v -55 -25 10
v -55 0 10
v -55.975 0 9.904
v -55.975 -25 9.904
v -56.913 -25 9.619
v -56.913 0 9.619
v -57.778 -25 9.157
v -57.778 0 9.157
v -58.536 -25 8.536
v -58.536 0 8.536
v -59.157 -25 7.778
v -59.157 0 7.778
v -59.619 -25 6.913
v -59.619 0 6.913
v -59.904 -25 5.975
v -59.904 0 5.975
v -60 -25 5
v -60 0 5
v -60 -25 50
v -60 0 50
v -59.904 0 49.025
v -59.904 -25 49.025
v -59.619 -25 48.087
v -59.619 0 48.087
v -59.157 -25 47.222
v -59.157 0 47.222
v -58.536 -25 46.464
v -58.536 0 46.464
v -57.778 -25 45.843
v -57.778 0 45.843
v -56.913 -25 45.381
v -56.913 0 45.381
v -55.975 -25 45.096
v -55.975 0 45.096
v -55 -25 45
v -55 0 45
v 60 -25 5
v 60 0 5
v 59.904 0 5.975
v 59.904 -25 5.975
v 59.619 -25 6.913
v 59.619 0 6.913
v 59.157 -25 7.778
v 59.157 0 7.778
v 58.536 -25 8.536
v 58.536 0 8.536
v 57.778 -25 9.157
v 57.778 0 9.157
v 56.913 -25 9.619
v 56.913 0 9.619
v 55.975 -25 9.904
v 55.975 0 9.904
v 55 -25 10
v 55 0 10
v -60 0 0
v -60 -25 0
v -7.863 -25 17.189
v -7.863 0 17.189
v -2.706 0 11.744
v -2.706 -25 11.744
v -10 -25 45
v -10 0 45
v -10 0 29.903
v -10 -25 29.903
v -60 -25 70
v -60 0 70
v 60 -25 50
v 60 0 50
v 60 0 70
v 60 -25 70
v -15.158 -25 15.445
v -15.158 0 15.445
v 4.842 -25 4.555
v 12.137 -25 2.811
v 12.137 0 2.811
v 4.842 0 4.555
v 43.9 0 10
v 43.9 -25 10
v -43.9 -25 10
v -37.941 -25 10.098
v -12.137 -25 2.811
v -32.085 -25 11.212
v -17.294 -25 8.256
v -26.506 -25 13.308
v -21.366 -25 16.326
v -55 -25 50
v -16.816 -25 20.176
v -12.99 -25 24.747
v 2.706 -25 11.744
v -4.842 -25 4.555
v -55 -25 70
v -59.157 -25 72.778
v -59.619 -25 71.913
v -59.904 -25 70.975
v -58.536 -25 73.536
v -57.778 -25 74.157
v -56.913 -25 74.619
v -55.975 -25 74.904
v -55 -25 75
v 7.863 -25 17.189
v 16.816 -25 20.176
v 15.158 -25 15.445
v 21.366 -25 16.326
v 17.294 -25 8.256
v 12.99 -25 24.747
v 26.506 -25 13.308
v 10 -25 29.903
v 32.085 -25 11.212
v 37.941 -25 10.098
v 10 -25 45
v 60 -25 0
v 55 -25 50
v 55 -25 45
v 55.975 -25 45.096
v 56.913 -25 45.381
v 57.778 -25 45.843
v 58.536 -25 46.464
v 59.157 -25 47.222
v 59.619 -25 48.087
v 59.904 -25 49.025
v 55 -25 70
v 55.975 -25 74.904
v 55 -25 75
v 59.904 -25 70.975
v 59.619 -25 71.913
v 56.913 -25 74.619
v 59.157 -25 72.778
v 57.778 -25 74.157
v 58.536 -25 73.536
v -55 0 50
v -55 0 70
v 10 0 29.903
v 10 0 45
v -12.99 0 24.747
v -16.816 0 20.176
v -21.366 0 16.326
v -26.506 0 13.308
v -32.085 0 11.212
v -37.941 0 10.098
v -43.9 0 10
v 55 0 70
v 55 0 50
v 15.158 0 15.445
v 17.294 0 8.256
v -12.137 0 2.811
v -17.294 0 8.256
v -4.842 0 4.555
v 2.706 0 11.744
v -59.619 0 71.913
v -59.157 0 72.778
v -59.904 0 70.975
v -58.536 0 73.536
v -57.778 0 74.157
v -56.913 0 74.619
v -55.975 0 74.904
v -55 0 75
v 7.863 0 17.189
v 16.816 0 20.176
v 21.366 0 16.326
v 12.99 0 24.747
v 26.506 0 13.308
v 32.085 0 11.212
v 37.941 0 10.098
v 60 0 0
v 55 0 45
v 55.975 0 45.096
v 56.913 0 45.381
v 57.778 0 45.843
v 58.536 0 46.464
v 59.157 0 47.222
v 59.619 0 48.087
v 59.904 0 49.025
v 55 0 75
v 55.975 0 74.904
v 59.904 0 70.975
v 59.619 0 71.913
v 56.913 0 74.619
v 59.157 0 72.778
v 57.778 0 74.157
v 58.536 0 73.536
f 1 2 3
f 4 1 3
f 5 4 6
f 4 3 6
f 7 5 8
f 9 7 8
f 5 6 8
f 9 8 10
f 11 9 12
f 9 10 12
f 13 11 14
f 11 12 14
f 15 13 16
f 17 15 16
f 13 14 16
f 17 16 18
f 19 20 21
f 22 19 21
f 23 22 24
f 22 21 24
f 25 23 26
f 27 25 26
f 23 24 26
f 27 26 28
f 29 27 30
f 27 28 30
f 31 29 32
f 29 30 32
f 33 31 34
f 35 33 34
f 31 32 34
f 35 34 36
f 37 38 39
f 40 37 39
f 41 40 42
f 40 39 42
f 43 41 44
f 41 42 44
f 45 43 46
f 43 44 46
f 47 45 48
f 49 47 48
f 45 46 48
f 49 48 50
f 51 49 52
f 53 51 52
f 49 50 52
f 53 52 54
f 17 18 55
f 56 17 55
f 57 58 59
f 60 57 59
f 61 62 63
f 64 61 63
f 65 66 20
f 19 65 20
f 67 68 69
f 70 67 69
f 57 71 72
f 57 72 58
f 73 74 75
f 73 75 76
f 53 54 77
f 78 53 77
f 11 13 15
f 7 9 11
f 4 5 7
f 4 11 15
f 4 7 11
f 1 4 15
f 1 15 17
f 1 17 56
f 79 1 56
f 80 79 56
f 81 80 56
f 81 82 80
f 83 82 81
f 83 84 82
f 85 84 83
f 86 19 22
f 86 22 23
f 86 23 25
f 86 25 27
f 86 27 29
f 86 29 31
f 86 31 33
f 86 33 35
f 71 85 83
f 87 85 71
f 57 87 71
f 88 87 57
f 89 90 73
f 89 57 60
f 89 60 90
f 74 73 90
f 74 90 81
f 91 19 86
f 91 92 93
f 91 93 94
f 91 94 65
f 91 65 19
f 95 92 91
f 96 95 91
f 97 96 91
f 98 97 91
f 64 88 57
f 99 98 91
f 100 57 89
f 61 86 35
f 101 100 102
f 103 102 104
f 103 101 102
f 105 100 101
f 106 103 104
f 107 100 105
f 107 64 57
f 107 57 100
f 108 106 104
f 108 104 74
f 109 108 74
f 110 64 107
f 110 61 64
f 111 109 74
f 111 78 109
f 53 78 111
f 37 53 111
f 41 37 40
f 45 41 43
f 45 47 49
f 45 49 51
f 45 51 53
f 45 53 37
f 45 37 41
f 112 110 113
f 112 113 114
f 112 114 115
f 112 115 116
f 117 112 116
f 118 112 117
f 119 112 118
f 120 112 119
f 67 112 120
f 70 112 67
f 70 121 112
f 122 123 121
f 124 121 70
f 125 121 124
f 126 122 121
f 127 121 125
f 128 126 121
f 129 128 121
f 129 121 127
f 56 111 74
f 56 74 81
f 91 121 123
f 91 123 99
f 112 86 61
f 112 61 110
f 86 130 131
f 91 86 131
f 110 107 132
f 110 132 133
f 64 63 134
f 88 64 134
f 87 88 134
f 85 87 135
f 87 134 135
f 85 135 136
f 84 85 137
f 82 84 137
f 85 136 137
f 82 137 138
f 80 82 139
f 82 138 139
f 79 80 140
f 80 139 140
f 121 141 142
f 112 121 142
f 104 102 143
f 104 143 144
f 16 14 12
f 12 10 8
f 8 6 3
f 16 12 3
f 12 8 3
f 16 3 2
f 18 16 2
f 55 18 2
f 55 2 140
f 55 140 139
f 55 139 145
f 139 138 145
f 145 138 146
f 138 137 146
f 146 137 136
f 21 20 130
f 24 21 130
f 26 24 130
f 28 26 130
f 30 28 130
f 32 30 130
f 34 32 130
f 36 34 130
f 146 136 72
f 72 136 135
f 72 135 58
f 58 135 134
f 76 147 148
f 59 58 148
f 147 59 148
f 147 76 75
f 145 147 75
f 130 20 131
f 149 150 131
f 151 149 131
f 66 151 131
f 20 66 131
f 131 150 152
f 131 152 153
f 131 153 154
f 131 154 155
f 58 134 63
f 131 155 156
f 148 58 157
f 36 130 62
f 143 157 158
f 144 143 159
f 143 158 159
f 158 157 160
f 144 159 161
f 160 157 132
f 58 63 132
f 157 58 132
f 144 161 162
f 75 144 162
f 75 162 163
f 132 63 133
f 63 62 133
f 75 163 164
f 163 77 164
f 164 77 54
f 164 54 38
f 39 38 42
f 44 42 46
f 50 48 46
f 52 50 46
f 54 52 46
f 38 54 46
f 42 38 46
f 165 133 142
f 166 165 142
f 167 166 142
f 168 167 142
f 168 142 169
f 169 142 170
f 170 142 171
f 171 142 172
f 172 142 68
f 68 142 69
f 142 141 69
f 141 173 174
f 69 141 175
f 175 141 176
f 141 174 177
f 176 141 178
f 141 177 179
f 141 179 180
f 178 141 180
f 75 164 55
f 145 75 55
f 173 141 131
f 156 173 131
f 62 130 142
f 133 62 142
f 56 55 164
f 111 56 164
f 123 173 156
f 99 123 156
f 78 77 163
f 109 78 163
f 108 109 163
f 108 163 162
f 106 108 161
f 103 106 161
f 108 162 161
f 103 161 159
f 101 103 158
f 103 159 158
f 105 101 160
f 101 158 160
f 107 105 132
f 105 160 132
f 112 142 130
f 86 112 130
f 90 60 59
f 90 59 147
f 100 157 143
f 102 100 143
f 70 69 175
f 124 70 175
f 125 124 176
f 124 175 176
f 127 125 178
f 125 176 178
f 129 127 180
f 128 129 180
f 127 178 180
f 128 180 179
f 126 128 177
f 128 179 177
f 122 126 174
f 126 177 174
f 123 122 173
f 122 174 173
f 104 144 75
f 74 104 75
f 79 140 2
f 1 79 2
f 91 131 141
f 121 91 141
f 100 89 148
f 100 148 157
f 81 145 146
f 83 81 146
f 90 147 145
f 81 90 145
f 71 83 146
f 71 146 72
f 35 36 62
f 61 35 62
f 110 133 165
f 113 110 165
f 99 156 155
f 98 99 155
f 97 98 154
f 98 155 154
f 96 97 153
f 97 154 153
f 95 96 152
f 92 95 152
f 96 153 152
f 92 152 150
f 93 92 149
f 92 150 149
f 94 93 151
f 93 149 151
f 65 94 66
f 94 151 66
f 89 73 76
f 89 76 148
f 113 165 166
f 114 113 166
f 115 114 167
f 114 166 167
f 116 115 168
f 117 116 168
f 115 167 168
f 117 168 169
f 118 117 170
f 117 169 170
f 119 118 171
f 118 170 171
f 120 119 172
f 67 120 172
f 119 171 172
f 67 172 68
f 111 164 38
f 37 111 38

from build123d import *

# Parameters (mm, degrees)
F1_DEPTH = 25


with BuildPart() as f1:
    # F0 (on Front) → F1 (new body)
    with BuildSketch(Plane.XZ):
        with BuildLine():
            Line((-60, 0), (0, 0))
            Line((0, 0), (60, 0))
            Line((60, 0), (60, 5))
            ThreePointArc((60, 5), (58.535534, 8.535534), (55, 10))
            Line((55, 10), (43.900207, 10))
            ThreePointArc((43.900207, 10), (23.870935, 14.706872), (10, 29.903039))
            Line((10, 29.903039), (10, 45))
            Line((10, 45), (55, 45))
            ThreePointArc((55, 45), (58.535534, 46.464466), (60, 50))
            Line((60, 50), (60, 70))
            ThreePointArc((60, 70), (58.535534, 73.535534), (55, 75))
            Line((55, 75), (0, 75))
            Line((0, 75), (-55, 75))
            ThreePointArc((-55, 75), (-58.535534, 73.535534), (-60, 70))
            Line((-60, 70), (-60, 50))
            ThreePointArc((-60, 50), (-58.535534, 46.464466), (-55, 45))
            Line((-55, 45), (-10, 45))
            Line((-10, 45), (-10, 29.903039))
            ThreePointArc((-10, 29.903039), (-23.870935, 14.706872), (-43.900207, 10))
            Line((-43.900207, 10), (-55, 10))
            ThreePointArc((-55, 10), (-58.535534, 8.535534), (-60, 5))
            Line((-60, 5), (-60, 0))
        make_face()
        Polygon((-12.136564, 2.810765), (-17.294342, 8.255701), (-15.157778, 15.444936), (-7.863436, 17.189235), (-2.705658, 11.744299), (-4.842222, 4.555064), align=None, mode=Mode.SUBTRACT)
        Polygon((15.157778, 15.444936), (17.294342, 8.255701), (12.136564, 2.810765), (4.842222, 4.555064), (2.705658, 11.744299), (7.863436, 17.189235), align=None, mode=Mode.SUBTRACT)
        Polygon((-55, 70), (0, 70), (55, 70), (55, 50), (0, 50), (-55, 50), align=None, mode=Mode.SUBTRACT)
    extrude(amount=F1_DEPTH)


solid = f1.part
